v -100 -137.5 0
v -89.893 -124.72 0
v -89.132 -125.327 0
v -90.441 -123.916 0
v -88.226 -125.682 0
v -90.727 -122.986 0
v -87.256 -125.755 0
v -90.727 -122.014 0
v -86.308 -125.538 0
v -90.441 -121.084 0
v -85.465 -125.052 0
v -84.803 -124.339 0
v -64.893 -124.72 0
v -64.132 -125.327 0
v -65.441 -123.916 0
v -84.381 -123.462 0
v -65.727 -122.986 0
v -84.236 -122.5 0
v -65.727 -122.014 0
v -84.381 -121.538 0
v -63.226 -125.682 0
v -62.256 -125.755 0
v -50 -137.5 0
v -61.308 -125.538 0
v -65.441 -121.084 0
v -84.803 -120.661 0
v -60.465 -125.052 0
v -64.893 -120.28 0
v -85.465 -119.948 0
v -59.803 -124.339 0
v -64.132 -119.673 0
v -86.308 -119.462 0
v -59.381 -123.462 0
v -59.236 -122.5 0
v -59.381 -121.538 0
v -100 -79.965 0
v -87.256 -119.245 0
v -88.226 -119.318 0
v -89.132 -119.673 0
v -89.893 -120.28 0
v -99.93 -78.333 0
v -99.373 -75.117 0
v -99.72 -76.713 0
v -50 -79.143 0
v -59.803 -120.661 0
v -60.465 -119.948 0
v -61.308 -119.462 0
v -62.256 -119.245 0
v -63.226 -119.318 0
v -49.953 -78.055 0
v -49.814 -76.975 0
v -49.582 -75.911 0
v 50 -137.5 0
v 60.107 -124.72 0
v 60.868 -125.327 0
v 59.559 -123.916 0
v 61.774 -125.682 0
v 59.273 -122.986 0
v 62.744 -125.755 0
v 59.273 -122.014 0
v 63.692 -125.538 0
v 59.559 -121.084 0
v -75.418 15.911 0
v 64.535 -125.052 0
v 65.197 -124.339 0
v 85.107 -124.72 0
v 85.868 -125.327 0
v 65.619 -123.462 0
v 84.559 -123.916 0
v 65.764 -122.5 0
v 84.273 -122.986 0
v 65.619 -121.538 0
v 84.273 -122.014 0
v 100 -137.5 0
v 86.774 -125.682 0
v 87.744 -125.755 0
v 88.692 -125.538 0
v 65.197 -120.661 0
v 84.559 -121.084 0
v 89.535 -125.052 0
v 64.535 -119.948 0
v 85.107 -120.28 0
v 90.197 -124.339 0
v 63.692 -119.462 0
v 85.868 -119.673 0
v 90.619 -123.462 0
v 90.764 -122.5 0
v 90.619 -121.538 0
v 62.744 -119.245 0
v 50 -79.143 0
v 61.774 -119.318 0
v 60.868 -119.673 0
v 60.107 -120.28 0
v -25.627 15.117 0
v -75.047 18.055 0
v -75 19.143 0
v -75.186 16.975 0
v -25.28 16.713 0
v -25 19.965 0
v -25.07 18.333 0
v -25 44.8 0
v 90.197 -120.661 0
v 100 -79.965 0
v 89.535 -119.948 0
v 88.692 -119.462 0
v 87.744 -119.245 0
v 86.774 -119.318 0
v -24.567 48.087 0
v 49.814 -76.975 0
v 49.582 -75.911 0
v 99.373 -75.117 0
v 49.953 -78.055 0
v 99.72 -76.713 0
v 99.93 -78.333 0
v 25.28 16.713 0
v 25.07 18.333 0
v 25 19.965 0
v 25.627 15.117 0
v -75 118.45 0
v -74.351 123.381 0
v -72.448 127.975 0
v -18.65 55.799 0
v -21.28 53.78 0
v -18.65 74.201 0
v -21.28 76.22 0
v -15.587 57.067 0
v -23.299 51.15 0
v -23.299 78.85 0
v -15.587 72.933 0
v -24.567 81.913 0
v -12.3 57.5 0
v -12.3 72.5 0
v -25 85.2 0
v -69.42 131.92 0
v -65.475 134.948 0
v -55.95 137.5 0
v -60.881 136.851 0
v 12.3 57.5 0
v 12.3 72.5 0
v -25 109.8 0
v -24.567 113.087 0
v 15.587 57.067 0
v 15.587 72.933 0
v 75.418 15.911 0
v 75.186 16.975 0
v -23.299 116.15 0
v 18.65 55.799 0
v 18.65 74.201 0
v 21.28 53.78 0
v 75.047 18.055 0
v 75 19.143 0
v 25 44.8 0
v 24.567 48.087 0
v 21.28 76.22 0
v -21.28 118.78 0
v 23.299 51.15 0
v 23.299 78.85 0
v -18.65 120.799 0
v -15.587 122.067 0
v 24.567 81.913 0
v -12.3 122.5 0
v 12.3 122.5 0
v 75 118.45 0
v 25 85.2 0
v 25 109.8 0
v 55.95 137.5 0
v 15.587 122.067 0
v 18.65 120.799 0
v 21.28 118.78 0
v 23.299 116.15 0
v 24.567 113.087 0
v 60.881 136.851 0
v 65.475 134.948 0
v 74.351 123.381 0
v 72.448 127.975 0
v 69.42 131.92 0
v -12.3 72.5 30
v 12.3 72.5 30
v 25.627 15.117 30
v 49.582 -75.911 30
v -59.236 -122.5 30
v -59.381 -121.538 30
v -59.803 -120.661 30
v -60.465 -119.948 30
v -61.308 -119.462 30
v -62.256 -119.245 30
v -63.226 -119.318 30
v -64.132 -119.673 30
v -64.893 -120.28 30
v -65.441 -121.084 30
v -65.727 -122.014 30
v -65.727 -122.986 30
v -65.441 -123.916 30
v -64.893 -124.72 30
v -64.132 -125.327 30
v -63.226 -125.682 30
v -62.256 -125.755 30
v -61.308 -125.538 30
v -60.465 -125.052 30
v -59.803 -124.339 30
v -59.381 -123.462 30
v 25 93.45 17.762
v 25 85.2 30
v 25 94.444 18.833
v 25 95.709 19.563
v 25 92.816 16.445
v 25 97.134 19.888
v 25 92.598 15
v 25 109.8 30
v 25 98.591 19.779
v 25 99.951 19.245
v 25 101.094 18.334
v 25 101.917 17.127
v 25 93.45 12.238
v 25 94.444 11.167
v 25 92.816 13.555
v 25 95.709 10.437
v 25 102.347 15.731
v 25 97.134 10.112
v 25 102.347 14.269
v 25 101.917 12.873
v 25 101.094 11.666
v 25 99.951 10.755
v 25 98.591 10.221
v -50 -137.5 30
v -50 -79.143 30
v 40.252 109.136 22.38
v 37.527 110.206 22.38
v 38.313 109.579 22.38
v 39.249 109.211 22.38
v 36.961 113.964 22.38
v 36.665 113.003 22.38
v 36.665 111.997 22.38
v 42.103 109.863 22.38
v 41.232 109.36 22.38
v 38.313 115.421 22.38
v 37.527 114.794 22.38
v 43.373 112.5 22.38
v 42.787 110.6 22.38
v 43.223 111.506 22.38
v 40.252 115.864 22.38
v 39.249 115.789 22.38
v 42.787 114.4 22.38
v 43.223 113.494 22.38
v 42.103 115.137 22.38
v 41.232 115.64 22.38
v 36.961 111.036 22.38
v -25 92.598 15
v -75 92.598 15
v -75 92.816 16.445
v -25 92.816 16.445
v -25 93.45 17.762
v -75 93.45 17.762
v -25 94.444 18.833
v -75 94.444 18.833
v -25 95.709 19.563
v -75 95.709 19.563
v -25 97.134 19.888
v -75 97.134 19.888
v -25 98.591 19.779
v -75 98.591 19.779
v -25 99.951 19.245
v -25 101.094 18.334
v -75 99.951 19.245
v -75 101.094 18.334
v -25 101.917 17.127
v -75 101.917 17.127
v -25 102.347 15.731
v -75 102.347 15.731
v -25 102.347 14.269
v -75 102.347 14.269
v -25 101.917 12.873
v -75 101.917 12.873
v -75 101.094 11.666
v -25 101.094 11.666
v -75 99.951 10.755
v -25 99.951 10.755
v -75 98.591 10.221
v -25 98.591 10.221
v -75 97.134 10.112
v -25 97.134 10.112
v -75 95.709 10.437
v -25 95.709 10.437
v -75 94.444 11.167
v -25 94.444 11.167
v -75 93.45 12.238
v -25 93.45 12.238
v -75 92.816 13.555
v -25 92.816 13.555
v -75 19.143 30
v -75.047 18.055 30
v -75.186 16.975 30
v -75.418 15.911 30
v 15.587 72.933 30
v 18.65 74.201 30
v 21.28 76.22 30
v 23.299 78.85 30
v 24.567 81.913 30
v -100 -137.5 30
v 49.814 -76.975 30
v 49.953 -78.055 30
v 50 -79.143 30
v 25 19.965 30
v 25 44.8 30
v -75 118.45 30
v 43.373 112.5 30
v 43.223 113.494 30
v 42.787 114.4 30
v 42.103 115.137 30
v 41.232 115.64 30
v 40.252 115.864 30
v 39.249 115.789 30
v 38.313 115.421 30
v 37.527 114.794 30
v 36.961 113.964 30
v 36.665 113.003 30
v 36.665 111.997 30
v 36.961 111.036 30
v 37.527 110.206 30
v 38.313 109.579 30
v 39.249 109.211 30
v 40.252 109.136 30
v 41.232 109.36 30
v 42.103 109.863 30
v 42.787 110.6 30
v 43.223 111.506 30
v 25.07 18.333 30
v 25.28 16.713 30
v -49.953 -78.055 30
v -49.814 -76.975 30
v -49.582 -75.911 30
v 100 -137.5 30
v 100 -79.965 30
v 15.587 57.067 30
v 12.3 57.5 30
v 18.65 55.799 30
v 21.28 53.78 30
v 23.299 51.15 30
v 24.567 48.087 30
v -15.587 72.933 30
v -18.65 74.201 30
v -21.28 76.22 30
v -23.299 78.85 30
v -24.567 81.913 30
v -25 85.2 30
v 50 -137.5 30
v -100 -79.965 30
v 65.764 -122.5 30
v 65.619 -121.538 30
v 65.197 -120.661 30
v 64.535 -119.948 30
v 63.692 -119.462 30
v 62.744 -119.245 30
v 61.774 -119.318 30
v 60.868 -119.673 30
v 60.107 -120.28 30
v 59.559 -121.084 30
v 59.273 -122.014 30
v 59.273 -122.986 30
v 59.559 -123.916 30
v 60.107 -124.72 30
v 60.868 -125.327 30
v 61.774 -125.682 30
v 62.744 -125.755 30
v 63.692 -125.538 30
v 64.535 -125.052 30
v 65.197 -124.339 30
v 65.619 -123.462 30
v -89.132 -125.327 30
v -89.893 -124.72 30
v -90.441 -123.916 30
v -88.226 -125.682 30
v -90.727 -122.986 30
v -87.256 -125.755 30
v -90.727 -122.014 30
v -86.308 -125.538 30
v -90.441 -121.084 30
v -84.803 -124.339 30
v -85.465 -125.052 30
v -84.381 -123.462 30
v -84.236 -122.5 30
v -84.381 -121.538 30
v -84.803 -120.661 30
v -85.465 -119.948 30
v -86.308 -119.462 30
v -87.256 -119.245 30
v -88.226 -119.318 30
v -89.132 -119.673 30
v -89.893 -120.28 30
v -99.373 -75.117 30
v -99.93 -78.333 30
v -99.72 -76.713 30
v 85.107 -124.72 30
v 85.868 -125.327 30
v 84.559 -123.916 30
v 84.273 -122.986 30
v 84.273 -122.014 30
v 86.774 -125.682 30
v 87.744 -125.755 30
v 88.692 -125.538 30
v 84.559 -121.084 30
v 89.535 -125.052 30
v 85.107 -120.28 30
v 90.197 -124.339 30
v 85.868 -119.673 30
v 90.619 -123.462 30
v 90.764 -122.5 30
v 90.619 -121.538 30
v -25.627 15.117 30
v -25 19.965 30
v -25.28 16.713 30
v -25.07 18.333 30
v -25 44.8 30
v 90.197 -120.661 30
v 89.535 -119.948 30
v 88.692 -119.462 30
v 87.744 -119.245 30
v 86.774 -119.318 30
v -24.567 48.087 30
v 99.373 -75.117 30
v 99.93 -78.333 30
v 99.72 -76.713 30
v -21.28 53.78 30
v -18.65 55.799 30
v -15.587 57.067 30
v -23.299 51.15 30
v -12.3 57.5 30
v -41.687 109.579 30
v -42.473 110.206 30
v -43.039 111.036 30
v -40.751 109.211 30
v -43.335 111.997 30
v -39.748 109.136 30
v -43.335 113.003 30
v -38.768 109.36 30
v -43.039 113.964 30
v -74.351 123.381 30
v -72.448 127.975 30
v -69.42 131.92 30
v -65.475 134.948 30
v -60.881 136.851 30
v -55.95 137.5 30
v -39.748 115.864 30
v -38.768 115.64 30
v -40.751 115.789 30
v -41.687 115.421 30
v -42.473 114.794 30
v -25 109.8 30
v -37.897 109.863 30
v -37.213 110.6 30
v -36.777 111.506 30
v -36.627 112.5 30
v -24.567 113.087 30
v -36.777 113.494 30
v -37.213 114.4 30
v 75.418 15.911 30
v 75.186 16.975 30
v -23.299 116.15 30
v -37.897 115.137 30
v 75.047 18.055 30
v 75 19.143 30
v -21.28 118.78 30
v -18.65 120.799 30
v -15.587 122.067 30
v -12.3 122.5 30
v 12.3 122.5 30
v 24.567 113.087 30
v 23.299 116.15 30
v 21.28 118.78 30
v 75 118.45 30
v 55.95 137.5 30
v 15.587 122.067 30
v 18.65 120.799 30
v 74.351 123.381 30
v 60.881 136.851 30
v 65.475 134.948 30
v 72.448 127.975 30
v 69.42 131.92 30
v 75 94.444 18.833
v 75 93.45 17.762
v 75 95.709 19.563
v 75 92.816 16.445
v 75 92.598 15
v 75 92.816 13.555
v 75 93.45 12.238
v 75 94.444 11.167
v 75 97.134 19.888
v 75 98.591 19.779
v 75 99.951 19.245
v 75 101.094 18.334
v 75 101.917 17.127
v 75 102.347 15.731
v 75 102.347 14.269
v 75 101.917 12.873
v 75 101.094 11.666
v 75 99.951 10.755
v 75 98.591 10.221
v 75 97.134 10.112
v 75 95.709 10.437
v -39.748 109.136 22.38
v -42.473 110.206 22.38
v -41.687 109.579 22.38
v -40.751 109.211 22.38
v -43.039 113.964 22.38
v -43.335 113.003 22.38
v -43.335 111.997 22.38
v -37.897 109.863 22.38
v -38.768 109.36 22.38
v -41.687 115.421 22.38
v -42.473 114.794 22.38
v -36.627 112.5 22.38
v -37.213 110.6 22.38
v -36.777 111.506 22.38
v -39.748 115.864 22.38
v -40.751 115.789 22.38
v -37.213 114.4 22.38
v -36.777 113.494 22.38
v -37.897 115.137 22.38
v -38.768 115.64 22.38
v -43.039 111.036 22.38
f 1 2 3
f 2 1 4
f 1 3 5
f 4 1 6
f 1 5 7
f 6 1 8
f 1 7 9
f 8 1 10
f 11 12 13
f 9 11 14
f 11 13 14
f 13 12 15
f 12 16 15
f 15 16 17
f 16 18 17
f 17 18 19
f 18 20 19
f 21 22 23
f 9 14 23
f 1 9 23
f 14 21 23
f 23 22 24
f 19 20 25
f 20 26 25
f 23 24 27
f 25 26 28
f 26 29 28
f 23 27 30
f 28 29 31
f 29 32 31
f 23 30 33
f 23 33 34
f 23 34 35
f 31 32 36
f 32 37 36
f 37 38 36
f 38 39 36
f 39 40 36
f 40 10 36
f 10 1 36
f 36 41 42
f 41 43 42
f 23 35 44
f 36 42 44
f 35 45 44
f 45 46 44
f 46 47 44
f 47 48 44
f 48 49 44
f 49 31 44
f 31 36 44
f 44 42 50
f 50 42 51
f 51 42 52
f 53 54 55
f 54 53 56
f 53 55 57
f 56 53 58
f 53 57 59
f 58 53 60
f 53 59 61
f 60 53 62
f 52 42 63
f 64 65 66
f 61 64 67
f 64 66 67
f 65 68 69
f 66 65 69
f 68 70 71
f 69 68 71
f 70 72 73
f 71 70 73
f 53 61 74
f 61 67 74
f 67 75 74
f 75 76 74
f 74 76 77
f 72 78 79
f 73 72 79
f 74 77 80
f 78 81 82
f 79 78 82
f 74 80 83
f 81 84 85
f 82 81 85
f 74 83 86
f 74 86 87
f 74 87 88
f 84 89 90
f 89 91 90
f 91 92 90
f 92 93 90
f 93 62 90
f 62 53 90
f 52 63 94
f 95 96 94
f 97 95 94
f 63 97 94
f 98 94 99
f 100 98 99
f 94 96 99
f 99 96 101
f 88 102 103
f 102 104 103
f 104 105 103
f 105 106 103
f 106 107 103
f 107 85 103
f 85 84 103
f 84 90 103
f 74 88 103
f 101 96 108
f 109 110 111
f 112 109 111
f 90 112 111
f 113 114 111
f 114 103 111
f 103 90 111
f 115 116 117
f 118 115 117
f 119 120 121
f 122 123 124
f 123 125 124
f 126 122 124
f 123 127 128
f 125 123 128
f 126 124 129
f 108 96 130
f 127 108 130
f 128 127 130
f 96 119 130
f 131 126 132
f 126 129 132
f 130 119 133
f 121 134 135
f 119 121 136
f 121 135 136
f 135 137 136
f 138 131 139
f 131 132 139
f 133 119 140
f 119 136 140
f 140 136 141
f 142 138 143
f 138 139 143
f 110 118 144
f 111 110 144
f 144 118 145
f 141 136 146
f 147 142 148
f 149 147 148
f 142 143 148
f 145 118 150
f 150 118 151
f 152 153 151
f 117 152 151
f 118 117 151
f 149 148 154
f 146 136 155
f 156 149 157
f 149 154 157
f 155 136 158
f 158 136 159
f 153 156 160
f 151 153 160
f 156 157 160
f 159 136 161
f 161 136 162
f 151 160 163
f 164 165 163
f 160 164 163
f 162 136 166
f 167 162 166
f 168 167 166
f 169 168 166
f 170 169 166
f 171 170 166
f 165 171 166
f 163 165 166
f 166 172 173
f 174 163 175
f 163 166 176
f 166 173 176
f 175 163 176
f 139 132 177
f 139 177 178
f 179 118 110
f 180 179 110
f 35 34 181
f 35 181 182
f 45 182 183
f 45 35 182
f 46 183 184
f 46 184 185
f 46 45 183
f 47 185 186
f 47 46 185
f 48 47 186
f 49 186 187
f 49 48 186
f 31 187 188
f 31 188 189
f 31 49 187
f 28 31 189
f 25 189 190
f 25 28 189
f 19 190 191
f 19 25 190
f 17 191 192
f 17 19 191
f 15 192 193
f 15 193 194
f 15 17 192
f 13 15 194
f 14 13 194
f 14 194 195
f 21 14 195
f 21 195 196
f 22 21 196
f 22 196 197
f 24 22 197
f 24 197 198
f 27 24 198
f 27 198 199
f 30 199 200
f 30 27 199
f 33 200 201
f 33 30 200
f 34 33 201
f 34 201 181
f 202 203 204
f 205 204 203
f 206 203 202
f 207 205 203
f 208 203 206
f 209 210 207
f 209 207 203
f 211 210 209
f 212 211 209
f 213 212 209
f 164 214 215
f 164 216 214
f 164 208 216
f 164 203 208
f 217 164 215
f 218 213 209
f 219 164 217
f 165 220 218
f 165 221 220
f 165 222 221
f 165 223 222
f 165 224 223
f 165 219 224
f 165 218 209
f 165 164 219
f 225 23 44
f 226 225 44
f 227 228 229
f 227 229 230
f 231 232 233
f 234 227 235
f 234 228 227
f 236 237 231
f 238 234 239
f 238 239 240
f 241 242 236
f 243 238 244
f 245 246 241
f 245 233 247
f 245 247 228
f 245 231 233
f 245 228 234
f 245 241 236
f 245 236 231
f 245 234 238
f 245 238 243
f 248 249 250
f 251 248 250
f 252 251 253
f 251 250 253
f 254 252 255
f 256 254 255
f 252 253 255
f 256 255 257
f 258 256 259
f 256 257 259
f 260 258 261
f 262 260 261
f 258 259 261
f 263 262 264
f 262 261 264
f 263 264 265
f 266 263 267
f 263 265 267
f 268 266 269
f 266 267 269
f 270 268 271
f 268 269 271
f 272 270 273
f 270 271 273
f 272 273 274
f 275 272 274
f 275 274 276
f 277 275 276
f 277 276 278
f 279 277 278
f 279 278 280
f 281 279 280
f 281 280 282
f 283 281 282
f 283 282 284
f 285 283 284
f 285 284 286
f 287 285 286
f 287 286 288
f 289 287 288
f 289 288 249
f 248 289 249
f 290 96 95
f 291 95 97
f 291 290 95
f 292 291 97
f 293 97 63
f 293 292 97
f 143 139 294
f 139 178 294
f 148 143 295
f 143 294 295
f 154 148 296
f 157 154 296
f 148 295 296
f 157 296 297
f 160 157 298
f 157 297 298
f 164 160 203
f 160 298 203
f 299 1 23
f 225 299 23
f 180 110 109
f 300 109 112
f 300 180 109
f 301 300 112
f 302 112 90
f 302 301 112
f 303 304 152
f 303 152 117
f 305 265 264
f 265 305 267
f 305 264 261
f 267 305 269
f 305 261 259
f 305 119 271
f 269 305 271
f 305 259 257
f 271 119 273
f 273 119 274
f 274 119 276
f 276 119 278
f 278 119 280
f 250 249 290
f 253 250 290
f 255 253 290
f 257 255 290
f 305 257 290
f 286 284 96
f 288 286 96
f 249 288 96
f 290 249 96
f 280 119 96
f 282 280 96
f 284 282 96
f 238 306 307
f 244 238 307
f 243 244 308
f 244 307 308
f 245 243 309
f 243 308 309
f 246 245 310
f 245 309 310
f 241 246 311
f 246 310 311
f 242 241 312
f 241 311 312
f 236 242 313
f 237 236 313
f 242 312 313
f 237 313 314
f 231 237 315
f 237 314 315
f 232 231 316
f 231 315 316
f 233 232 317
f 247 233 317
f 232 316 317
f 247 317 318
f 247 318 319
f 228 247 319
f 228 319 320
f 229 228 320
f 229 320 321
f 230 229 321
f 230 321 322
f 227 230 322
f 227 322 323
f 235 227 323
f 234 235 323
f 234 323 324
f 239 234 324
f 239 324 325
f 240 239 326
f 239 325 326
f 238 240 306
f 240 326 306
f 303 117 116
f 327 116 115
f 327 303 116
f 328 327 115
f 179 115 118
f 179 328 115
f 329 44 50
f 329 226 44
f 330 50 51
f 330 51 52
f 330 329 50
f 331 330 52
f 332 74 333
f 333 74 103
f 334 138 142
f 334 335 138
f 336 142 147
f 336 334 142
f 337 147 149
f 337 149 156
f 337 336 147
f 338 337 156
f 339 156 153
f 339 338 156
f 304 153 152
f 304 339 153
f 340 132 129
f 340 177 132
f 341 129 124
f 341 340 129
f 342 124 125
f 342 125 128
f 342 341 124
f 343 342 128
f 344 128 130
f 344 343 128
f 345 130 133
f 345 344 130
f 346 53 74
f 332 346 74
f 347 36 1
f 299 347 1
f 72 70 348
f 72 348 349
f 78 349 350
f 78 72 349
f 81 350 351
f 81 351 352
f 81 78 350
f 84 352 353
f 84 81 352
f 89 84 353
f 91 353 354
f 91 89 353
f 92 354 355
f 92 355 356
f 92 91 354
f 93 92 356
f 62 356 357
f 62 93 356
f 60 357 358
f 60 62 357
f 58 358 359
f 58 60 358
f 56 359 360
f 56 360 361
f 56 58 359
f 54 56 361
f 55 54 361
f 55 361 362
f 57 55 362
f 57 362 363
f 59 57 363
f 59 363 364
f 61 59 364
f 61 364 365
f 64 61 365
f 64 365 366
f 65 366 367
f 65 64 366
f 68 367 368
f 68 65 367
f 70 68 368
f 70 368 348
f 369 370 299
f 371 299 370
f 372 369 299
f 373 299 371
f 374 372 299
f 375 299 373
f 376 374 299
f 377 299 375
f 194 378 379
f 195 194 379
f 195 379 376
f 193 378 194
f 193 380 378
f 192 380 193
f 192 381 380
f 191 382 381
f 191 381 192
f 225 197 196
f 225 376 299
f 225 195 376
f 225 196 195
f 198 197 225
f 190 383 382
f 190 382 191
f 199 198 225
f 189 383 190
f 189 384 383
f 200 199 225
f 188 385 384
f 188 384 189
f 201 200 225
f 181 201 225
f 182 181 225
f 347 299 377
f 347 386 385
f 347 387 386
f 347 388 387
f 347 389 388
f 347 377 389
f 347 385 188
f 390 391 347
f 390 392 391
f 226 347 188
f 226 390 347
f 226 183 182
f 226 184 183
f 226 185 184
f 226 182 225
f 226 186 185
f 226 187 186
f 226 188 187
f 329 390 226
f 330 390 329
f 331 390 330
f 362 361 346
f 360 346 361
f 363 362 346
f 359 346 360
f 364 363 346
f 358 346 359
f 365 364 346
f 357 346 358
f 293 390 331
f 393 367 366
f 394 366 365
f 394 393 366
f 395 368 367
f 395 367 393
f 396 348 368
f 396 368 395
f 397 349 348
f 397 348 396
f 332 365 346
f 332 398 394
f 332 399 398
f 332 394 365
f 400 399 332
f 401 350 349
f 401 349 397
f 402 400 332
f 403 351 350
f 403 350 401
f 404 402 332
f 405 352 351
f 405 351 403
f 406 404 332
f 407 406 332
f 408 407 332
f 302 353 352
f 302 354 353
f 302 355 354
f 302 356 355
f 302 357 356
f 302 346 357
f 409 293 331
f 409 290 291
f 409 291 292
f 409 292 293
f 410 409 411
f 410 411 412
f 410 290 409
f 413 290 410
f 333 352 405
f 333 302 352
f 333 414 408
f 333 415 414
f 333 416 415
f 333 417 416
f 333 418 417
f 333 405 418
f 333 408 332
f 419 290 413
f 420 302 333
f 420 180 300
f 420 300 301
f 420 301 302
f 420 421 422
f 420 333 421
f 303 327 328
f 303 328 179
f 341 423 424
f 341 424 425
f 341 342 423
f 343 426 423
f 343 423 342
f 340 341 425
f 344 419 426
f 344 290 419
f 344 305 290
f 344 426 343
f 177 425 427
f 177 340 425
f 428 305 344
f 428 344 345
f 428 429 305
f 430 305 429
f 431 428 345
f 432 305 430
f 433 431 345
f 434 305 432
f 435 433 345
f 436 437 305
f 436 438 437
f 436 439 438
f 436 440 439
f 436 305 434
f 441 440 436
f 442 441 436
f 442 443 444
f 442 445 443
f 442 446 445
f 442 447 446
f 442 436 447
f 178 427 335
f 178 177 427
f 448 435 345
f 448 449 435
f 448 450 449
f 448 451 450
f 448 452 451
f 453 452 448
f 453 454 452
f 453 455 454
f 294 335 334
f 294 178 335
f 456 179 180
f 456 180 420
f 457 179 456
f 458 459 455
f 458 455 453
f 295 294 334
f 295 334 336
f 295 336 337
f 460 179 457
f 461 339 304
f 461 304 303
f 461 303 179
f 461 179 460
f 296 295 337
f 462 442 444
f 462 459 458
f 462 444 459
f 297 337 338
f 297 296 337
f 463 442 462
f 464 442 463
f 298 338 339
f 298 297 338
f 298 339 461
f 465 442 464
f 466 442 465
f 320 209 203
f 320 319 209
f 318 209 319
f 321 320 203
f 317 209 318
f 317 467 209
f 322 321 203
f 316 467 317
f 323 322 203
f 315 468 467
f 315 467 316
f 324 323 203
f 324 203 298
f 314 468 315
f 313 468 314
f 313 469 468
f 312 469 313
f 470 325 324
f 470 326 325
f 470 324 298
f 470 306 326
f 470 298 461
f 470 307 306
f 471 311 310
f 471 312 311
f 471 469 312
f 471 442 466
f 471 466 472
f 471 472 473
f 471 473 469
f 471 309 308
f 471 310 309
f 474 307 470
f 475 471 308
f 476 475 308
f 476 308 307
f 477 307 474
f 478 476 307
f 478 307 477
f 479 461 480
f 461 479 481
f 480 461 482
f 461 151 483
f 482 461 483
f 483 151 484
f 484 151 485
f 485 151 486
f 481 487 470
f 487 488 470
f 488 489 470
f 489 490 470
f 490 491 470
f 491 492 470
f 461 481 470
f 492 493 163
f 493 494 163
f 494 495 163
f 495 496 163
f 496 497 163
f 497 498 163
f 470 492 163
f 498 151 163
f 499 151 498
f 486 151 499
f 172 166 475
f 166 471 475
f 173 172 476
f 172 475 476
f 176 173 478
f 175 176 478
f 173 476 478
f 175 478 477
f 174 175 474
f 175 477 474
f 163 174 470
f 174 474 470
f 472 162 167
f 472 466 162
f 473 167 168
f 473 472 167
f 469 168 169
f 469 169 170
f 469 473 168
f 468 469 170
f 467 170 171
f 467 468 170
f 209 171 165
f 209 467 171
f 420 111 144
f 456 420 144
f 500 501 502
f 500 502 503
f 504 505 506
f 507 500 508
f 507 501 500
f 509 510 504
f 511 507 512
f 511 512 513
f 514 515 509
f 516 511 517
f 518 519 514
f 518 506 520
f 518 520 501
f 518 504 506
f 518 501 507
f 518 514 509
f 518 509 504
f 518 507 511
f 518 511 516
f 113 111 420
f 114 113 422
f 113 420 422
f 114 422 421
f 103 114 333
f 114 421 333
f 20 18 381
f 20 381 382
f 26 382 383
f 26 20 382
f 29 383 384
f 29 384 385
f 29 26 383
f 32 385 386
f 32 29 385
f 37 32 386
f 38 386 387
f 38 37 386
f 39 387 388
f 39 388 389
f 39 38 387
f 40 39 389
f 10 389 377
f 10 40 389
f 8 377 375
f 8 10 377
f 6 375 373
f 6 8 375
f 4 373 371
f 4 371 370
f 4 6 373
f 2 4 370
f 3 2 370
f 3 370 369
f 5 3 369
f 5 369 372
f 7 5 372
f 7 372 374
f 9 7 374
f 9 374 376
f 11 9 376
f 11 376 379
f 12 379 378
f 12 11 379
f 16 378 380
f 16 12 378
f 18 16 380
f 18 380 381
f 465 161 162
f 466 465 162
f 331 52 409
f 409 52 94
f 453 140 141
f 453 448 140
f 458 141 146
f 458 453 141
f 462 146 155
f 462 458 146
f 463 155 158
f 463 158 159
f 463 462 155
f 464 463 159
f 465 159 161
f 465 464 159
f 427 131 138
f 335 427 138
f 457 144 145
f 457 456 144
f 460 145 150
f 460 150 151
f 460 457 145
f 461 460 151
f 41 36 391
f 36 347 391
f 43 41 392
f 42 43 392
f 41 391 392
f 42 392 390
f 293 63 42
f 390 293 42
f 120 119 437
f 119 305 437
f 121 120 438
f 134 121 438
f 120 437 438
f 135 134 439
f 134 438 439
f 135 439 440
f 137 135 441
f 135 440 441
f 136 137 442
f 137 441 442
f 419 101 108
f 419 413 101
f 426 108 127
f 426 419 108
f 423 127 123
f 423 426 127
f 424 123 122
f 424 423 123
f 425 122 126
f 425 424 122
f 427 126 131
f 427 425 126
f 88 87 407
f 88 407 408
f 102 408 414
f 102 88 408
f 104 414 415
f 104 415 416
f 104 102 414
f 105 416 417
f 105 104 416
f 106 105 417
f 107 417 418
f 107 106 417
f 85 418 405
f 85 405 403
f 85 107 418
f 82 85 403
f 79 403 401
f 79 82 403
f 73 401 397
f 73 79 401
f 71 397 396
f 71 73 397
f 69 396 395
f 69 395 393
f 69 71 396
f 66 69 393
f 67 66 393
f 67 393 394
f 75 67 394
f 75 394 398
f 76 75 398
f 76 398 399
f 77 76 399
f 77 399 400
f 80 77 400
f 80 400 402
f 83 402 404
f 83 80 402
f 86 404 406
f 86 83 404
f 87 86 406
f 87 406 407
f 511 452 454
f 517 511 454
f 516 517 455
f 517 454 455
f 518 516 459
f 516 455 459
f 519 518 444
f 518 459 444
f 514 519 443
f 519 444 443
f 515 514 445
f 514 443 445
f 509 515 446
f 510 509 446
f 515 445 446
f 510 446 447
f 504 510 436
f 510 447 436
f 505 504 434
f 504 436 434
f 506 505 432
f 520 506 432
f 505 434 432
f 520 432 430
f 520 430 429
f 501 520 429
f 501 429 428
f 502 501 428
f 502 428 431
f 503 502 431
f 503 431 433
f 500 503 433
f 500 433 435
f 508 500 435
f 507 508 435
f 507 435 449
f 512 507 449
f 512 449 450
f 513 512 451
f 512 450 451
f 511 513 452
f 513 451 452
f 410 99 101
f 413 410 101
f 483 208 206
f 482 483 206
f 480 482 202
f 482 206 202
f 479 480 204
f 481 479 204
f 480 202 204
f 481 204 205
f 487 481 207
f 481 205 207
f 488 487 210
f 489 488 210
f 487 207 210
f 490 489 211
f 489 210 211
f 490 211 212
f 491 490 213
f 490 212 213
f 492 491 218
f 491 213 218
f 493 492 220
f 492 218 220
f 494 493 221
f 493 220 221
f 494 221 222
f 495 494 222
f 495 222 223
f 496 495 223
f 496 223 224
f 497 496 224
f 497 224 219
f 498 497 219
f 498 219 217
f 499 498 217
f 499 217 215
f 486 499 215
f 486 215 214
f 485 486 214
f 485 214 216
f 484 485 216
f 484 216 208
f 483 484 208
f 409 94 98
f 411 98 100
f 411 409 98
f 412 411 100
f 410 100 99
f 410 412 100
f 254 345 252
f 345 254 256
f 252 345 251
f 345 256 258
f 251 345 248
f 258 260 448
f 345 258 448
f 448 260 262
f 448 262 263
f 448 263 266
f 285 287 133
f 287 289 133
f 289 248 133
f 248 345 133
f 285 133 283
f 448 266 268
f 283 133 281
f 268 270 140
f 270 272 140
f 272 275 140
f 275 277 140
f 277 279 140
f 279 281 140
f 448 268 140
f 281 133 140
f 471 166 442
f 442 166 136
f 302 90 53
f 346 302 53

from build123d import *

# Parameters (mm, degrees)
F0_R     = 3.2639
F0_R_2   = 3.37312
F0_W     = 50
F0_H     = 50
F1_DEPTH = 30
F2_R     = 12.7
F3_R     = 19.05
F4_R     = 3.37312
F5_DEPTH = 7.62
F6_R     = 4.9022
F7_DEPTH = 175.001


with BuildPart() as f1:
    # F0 (on Top) → F1 (new body)
    with BuildSketch(Plane.XY):
        Polygon((-100, -137.5), (-50, -137.5), (-50, -77.5), (-25, 17.5), (-25, 57.5), (25, 57.5), (25, 17.5), (50, -77.5), (50, -137.5), (100, -137.5), (100, -77.5), (75, 17.5), (75, 137.5), (-75, 137.5), (-75, 17.5), (-100, -77.5), align=None)
        with Locations((-87.5, -122.5)):
            Circle(F0_R, mode=Mode.SUBTRACT)
        with Locations((-62.5, -122.5)):
            Circle(F0_R, mode=Mode.SUBTRACT)
        with Locations((62.5, -122.5)):
            Circle(F0_R, mode=Mode.SUBTRACT)
        with Locations((87.5, -122.5)):
            Circle(F0_R, mode=Mode.SUBTRACT)
        with Locations((-40, 112.5)):
            Circle(F0_R_2, mode=Mode.SUBTRACT)
        with Locations((0, 97.5)):
            Rectangle(F0_W, F0_H, mode=Mode.SUBTRACT)
        with Locations((40, 112.5)):
            Circle(F0_R_2, mode=Mode.SUBTRACT)
        with Locations((-40, 112.5)):
            Circle(F0_R_2)
        with Locations((40, 112.5)):
            Circle(F0_R_2)
    extrude(amount=F1_DEPTH)

    # F2
    f2_edges = [f1.edges().sort_by_distance(p)[0] for p in [
        (-25, 122.5, 15),
        (25, 122.5, 15),
        (25, 72.5, 15),
        (-25, 72.5, 15),
        (-25, 57.5, 15),
        (25, 57.5, 15),
        (50, -77.5, 15),
        (-50, -77.5, 15),
        (-75, 17.5, 15),
        (75, 17.5, 15),
    ]]
    fillet(f2_edges, radius=F2_R)

    # F3
    f3_edges = [f1.edges().sort_by_distance(p)[0] for p in [
        (-100, -77.5, 15),
        (-75, 137.5, 15),
        (75, 137.5, 15),
        (100, -77.5, 15),
        (25, 17.5, 15),
        (-25, 17.5, 15),
    ]]
    fillet(f3_edges, radius=F3_R)

    # F4 (on face) → F5 (cut)
    with BuildSketch(Plane.XY.offset(30)):
        with Locations((-40, 112.5)):
            Circle(F4_R)
        with Locations((40, 112.5)):
            Circle(F4_R)
    extrude(amount=-F5_DEPTH, mode=Mode.SUBTRACT)

    # F6 (on face) → F7 (cut, through all)
    with BuildSketch(Plane(origin=(-75, 0, 0), x_dir=(0, -1, 0), z_dir=(-1, 0, 0))):
        with Locations((-97.5, 15)):
            Circle(F6_R)
    extrude(amount=-F7_DEPTH, mode=Mode.SUBTRACT)


solid = f1.part
